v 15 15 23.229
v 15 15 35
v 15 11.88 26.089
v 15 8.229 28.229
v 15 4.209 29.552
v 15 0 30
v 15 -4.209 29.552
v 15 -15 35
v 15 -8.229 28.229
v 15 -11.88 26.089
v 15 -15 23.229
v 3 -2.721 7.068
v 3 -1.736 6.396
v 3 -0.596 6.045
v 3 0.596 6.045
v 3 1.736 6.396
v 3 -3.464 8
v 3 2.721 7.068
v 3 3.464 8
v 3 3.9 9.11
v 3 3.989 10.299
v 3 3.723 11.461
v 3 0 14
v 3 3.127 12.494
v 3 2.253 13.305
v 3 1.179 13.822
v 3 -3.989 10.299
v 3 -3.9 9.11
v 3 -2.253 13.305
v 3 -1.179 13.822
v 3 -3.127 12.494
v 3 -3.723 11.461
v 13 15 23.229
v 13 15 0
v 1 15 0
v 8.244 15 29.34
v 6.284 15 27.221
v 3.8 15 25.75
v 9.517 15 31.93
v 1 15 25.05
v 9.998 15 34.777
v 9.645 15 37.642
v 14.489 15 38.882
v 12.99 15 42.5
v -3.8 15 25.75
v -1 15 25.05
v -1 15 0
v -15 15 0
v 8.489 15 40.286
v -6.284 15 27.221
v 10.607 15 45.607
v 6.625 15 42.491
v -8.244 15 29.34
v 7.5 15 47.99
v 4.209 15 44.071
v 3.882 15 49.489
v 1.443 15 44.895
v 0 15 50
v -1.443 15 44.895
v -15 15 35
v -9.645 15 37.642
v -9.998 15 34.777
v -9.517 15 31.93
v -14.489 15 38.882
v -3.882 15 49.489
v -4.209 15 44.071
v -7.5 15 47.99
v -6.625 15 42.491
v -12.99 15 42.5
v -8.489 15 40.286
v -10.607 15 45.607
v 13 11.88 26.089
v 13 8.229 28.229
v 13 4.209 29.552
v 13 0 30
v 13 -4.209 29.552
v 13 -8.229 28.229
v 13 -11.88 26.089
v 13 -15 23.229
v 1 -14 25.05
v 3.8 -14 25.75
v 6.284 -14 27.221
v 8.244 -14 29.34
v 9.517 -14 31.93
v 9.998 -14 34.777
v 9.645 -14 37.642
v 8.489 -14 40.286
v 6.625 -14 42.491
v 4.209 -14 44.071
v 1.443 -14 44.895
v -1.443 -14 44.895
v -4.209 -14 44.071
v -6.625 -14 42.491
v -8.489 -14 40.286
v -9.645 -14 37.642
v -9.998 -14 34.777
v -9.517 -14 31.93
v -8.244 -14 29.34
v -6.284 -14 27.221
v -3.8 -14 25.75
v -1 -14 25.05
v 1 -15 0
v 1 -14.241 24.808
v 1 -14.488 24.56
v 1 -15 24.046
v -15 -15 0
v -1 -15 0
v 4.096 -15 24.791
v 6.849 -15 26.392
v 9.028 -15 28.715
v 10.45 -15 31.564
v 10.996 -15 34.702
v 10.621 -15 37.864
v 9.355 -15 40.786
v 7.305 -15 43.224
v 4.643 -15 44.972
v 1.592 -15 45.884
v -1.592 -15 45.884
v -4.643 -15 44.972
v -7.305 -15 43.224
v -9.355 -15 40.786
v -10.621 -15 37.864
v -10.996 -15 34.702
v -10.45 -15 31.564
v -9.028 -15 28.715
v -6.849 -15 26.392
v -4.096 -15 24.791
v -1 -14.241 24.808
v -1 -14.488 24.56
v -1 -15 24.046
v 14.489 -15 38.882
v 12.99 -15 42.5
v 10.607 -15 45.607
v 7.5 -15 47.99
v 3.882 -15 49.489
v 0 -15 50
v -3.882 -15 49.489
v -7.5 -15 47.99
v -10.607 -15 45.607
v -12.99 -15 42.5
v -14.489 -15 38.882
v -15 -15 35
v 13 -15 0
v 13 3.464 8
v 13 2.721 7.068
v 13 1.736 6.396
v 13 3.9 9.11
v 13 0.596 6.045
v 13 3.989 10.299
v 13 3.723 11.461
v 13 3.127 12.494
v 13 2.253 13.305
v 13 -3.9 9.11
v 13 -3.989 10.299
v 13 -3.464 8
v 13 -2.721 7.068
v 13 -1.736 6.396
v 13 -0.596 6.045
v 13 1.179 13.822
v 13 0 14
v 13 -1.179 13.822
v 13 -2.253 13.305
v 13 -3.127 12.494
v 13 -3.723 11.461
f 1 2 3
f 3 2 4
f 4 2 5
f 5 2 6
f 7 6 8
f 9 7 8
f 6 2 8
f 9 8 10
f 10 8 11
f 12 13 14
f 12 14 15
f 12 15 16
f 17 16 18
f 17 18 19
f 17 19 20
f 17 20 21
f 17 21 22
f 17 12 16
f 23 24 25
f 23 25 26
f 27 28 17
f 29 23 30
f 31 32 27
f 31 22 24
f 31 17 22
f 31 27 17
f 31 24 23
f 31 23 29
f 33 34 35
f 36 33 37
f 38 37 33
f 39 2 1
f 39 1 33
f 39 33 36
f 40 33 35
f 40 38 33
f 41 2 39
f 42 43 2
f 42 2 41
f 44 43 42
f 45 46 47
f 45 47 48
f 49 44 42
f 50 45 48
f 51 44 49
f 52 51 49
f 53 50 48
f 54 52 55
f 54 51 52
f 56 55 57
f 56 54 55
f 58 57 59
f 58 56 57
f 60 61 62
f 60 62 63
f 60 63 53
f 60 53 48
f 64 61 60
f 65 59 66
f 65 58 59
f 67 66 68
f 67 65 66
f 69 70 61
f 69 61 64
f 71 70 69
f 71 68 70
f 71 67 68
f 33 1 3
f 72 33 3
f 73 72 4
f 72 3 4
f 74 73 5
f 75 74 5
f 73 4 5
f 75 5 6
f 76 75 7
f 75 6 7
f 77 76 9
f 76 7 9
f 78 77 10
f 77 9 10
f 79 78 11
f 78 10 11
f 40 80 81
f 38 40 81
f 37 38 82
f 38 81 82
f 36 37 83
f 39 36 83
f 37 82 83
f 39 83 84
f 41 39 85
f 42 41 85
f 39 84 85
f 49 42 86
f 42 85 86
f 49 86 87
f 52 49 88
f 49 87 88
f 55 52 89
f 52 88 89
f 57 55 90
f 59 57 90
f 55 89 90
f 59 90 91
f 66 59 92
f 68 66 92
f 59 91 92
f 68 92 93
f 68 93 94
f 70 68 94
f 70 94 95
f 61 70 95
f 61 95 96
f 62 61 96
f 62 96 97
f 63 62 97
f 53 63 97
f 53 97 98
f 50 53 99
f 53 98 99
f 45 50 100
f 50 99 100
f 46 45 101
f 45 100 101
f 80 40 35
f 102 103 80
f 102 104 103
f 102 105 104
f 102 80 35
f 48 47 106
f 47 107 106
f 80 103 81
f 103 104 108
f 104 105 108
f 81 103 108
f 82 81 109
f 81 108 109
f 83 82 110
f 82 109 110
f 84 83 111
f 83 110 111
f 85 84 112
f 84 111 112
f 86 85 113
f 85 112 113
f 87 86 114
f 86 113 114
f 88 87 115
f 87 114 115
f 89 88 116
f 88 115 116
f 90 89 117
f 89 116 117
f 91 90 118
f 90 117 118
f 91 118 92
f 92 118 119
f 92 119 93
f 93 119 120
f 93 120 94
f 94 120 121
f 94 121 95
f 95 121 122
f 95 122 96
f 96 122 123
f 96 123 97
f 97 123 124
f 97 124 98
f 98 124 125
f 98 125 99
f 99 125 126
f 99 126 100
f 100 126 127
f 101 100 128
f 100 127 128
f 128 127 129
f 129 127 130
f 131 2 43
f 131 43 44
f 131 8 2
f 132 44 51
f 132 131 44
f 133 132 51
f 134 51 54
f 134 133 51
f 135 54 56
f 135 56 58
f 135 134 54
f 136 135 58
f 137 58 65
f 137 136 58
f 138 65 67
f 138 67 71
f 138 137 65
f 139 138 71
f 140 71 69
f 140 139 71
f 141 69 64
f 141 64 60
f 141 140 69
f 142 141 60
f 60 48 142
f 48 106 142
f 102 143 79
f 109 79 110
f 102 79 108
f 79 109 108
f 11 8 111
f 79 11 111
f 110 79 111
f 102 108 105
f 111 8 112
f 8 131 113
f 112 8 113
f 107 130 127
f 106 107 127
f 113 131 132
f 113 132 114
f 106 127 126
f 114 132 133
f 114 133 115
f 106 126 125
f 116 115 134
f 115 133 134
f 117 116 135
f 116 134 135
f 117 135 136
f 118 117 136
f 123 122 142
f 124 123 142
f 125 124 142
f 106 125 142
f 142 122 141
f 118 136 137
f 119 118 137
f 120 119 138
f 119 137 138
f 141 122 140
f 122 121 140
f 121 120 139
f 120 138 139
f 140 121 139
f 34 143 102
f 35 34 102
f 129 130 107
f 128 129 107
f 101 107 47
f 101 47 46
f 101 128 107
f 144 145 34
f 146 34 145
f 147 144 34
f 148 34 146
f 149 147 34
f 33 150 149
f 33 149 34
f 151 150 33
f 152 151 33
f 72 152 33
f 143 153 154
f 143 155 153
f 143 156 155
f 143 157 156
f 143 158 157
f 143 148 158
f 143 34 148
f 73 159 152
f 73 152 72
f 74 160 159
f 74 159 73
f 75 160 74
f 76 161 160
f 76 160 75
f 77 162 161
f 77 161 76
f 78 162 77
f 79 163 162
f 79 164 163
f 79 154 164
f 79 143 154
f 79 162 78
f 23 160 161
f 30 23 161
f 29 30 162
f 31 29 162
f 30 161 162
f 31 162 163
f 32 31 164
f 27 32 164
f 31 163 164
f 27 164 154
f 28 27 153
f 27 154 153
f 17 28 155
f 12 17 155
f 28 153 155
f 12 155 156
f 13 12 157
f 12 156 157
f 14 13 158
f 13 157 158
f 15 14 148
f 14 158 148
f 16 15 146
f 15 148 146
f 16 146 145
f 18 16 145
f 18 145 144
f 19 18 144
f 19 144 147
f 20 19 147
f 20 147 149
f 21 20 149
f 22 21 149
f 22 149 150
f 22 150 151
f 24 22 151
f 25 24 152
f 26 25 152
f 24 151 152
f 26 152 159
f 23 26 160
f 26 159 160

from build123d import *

# Parameters (mm, degrees)
PAD_DEPTH       = 15
POCKET_DEPTH    = 2
SKETCH002_R     = 4
POCKET001_DEPTH = 10
CHAMFER_SIZE    = 1


with BuildPart() as part:
    # Sketch → Pad (new body, symmetric)
    with BuildSketch(Plane.XZ):
        with BuildLine():
            ThreePointArc((1, 25.050126), (0, 45), (-1, 25.050126))
            Line((-1, 0), (-1, 25.050126))
            Line((-1, 0), (-15, 0))
            Line((-15, 0), (-15, 35))
            ThreePointArc((15, 35), (0, 50), (-15, 35))
            Line((15, 35), (15, 0))
            Line((15, 0), (1, 0))
            Line((1, 25.050126), (1, 0))
        make_face()
    extrude(amount=PAD_DEPTH, both=True)

    # Sketch001 (on Face1 of Pad) → Pocket (cut)
    with BuildSketch(Plane(origin=(15, 0, 0), x_dir=(0, 0, 1), z_dir=(1, 0, 0))):
        with BuildLine():
            ThreePointArc((23.228757, -15), (30, 0), (23.228757, 15))
            Line((0, 15), (23.228757, 15))
            Line((0, 15), (0, -15))
            Line((0, -15), (23.228757, -15))
        make_face()
    extrude(amount=-POCKET_DEPTH, mode=Mode.SUBTRACT)

    # Sketch002 (on Face12 of Pocket) → Pocket001 (cut)
    with BuildSketch(Plane(origin=(13, 0, 0), x_dir=(0, 0, 1), z_dir=(1, 0, 0))):
        with Locations((10, 0)):
            Circle(SKETCH002_R)
    extrude(amount=-POCKET001_DEPTH, mode=Mode.SUBTRACT)

    # Chamfer
    chamfer_edges = [part.edges().sort_by_distance(p)[0] for p in [
        (0, -15, 45),
    ]]
    chamfer(chamfer_edges, length=CHAMFER_SIZE)


solid = part.part
